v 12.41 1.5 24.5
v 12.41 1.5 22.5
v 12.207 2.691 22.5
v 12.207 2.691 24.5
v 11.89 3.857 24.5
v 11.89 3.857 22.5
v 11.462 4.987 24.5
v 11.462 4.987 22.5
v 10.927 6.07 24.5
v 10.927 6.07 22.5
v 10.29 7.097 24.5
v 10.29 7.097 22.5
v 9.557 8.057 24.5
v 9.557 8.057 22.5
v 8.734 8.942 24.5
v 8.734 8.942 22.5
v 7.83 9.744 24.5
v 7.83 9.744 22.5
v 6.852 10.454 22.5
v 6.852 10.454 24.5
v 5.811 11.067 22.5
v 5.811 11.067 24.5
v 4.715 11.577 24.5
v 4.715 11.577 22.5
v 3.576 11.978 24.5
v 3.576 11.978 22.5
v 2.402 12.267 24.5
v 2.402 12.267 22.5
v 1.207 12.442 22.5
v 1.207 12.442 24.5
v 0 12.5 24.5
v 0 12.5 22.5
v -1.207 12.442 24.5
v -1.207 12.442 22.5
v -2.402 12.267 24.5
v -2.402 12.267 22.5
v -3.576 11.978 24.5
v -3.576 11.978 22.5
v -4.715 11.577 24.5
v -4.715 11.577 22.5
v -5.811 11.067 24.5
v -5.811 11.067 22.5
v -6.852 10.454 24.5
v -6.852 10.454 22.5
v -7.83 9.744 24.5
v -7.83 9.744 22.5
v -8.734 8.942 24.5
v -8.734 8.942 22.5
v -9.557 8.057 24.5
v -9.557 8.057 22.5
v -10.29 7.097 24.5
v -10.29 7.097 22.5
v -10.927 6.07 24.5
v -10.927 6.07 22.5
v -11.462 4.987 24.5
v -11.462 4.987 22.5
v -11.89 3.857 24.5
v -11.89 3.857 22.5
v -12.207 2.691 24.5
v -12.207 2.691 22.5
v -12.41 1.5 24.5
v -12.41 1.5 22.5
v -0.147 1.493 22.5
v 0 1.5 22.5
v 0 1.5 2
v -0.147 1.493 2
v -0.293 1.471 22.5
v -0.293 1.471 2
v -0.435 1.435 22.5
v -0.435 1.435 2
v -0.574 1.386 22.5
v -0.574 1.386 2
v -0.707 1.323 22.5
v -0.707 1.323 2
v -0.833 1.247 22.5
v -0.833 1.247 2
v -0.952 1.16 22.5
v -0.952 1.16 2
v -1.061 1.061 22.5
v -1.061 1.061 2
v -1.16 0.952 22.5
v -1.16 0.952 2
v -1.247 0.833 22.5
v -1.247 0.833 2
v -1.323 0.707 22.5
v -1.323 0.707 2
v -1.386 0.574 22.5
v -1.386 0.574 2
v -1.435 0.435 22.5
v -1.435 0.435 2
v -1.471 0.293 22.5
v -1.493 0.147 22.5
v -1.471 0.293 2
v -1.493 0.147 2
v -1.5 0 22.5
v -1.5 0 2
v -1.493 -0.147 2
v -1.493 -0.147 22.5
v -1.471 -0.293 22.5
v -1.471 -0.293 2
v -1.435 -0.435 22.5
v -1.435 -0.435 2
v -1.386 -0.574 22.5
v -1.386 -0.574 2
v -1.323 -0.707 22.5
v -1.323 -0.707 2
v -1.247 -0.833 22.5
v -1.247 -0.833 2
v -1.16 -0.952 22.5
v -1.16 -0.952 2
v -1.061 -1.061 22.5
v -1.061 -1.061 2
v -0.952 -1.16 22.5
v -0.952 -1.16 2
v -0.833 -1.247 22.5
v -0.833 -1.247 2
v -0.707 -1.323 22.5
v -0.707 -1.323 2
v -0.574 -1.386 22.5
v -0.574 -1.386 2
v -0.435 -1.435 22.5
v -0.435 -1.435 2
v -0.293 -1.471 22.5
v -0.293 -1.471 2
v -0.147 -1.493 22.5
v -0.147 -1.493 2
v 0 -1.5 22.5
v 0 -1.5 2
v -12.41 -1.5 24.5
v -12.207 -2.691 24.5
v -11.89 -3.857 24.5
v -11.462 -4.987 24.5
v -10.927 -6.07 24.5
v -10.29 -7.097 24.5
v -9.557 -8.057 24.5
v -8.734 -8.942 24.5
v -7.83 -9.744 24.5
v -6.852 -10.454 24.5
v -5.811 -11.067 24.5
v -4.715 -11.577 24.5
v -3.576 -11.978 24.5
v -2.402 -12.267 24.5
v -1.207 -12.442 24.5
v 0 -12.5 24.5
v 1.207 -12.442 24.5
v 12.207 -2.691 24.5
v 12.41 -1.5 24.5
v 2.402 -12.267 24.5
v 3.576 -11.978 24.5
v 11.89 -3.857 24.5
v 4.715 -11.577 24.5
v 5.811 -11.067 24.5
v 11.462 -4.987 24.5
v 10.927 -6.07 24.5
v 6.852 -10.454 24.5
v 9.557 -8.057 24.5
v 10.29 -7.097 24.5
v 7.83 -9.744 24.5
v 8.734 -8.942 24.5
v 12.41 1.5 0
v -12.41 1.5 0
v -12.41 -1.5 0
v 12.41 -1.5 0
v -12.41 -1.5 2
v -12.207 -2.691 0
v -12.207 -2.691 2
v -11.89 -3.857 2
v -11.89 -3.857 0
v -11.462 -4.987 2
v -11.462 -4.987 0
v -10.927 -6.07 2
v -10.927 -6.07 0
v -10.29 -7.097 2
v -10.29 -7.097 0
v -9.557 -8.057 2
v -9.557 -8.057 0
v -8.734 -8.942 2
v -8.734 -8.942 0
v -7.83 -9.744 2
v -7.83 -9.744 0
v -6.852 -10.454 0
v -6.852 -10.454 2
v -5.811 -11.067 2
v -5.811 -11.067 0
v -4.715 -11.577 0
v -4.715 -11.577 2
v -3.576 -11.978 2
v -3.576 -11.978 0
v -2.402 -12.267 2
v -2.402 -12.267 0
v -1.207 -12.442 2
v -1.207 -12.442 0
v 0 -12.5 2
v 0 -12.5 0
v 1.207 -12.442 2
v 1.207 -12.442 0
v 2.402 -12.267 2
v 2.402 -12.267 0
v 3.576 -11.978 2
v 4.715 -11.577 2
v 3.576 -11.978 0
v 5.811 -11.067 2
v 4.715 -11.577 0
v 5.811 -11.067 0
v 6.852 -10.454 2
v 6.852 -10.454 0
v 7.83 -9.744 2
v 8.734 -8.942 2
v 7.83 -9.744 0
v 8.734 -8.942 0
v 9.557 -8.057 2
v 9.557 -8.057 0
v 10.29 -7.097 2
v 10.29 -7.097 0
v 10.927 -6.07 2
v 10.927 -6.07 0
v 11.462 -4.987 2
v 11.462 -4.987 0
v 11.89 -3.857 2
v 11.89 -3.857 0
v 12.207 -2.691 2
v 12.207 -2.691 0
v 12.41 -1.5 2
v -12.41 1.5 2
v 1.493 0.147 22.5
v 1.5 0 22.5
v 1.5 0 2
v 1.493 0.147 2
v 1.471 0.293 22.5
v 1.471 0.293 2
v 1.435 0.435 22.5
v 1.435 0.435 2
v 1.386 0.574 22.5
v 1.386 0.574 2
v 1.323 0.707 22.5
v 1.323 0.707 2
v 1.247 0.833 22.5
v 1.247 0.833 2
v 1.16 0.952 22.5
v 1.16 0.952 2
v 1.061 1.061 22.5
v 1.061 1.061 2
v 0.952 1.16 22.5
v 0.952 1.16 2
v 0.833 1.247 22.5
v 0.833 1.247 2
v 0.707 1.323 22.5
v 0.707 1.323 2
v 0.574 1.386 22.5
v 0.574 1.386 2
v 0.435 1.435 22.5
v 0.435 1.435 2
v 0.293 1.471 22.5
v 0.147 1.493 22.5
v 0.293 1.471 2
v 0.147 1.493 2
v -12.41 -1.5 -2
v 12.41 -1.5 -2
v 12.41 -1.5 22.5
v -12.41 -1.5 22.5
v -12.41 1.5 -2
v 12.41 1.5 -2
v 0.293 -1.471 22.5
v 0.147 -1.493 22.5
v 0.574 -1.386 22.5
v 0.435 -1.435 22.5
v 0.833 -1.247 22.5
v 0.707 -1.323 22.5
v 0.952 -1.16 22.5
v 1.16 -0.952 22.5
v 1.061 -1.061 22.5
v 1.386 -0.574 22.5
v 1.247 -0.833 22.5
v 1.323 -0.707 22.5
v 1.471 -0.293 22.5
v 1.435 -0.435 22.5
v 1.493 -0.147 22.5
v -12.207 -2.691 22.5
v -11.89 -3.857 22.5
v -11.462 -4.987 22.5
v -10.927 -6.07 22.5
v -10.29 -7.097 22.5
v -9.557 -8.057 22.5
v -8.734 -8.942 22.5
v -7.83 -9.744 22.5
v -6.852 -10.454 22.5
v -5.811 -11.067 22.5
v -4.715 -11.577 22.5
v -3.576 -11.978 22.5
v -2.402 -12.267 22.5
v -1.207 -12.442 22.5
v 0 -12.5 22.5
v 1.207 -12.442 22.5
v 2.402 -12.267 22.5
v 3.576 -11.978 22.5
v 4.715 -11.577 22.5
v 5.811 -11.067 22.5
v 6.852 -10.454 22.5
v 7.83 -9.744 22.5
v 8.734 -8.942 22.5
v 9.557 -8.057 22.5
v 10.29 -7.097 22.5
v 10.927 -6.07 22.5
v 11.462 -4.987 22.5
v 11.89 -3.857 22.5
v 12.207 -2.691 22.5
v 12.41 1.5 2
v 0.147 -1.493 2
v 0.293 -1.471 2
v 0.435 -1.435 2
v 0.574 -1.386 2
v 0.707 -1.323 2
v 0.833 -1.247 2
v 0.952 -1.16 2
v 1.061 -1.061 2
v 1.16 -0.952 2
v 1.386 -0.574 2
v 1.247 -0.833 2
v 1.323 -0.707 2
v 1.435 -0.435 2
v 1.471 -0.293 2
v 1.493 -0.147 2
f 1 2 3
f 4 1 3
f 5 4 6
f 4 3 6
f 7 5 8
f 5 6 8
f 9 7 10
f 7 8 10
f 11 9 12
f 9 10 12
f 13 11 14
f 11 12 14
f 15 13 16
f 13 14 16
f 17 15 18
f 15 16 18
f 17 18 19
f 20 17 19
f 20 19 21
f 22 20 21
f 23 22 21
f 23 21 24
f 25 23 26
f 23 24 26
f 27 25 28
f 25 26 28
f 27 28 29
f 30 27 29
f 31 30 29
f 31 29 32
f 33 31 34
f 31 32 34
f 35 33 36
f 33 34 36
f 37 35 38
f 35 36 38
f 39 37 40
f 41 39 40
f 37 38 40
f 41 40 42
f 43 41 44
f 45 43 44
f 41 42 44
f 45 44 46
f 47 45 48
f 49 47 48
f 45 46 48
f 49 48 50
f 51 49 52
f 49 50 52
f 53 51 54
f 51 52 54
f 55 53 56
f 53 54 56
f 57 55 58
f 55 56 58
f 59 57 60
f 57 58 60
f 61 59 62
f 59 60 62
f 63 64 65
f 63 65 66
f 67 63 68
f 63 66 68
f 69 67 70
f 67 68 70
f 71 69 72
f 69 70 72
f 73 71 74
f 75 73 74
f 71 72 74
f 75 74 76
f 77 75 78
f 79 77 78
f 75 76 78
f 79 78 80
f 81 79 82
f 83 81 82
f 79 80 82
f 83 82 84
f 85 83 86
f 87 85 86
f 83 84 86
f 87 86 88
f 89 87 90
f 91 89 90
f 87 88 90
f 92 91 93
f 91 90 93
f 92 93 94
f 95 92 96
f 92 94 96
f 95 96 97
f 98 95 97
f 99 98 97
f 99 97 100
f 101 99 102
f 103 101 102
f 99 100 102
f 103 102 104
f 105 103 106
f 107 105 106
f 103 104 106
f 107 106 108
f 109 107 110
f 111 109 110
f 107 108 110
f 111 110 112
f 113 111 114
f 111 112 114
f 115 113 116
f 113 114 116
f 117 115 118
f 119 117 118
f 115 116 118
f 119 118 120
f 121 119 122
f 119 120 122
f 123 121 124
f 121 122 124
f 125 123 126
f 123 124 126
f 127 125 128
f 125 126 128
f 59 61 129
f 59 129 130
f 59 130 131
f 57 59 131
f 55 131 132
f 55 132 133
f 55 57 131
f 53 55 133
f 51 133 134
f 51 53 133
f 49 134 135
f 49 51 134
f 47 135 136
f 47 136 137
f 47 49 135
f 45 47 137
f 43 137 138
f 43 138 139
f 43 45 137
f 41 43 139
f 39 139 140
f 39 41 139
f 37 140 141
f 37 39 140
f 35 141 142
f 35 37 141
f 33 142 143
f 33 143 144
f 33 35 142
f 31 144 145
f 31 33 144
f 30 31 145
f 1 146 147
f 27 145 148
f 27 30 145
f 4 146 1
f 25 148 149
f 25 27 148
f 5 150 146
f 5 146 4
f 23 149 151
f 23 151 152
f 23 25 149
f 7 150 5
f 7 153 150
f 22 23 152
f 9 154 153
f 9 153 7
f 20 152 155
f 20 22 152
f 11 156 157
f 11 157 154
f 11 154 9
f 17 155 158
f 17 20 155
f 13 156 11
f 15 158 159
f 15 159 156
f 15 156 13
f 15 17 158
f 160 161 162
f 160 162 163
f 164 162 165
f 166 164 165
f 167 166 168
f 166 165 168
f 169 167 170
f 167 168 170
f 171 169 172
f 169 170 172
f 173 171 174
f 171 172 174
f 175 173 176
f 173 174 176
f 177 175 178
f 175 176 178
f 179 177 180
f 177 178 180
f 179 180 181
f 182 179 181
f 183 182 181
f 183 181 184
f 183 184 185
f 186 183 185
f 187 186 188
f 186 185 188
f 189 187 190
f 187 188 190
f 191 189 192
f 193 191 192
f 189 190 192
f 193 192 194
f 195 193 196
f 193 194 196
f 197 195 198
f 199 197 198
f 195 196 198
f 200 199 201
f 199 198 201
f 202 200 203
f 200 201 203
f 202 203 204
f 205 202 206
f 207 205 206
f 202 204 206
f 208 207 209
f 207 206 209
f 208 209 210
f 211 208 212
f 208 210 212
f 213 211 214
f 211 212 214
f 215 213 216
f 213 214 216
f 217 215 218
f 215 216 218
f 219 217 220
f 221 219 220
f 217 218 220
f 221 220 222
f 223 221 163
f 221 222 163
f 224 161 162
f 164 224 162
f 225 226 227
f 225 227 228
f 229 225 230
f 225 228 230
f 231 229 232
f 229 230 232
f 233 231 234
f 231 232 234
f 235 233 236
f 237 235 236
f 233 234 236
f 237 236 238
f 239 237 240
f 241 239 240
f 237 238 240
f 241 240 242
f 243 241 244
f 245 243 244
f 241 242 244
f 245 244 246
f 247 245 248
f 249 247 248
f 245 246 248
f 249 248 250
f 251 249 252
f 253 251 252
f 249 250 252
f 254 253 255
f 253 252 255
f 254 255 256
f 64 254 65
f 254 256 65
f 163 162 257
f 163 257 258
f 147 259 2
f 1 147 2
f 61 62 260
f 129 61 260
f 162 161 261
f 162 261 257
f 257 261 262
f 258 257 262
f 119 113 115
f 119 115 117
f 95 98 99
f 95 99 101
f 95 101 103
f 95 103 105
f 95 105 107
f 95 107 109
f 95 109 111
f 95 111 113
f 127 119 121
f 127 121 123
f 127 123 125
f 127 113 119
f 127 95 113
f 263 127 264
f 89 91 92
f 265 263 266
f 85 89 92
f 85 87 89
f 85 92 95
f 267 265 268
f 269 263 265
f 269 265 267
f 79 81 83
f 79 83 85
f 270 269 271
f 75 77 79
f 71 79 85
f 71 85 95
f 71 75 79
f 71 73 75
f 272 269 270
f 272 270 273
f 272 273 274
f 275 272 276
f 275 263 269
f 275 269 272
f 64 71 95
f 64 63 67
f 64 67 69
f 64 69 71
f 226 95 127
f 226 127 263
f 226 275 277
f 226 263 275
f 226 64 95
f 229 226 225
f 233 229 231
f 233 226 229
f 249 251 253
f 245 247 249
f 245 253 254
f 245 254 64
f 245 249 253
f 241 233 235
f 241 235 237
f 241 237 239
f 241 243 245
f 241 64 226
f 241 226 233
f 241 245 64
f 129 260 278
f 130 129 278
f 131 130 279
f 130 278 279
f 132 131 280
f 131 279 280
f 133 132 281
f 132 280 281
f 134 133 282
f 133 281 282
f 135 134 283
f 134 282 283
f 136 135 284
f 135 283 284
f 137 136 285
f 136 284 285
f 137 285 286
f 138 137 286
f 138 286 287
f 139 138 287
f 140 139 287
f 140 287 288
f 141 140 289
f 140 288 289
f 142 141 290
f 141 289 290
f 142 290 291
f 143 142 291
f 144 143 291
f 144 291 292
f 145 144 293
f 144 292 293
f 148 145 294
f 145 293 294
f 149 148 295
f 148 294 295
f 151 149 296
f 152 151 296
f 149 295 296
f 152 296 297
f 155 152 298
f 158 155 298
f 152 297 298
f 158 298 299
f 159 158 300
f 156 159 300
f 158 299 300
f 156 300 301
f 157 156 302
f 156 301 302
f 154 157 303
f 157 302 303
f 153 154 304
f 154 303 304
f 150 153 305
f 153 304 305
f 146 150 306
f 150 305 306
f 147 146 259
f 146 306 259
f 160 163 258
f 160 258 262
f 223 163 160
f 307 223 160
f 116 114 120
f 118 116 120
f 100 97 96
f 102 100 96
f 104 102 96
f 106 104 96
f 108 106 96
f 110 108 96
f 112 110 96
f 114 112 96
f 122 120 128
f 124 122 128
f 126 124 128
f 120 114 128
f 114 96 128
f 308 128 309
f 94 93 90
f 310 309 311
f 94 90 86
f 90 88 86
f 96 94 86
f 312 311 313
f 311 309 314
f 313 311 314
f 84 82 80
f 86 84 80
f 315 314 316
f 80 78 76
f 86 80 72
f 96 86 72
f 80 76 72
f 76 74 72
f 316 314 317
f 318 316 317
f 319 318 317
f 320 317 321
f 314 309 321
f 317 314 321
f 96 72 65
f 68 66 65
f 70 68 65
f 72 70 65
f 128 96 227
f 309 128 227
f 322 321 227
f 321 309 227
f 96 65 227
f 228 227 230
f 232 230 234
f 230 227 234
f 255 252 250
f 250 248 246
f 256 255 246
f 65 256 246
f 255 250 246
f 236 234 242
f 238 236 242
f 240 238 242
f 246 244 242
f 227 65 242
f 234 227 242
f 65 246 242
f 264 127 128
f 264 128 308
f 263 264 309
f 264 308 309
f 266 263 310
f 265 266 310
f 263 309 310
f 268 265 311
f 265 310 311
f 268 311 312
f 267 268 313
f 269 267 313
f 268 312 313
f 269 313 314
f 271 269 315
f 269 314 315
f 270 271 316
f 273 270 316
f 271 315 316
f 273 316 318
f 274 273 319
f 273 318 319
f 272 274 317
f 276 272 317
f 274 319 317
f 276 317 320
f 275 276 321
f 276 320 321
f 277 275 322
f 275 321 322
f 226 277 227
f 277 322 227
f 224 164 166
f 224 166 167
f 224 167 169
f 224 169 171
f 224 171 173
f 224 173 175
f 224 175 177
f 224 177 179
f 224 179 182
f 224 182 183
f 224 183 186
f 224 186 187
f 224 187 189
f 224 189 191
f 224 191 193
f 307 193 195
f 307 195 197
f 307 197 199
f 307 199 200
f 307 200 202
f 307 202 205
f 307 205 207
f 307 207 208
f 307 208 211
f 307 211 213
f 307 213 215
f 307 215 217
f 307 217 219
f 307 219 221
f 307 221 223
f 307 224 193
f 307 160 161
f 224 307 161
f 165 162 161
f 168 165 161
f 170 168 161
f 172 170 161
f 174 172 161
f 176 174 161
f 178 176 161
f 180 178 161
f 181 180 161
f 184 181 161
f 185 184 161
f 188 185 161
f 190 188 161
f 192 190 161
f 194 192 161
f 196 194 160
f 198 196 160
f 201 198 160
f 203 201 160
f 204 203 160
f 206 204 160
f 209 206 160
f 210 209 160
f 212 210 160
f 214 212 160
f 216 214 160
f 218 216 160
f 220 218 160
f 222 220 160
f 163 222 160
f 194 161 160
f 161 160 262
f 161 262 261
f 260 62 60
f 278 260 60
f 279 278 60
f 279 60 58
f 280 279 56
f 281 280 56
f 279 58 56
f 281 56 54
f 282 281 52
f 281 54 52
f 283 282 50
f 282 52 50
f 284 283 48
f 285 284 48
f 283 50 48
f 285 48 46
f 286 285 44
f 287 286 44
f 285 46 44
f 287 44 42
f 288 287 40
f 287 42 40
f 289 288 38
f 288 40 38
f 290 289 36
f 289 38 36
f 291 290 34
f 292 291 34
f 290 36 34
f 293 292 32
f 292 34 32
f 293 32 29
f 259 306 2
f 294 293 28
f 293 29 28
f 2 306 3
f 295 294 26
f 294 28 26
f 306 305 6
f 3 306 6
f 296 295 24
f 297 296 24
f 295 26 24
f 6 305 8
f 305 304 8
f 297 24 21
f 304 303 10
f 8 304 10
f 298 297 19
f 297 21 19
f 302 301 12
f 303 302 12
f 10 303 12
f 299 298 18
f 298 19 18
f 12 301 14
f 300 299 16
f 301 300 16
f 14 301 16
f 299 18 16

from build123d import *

# Parameters (mm, degrees)
F1_DEPTH = 2
F2_START = 2
F2_DEPTH = 20.5
F3_START = 22.5
F3_DEPTH = 2
F4_DEPTH = 2


with BuildPart() as f1:
    # F0 (on Top) → F1 (new body)
    with BuildSketch(Plane.XY):
        with BuildLine():
            Line((12.409673646, 0), (1.5, 0))
            ThreePointArc((1.5, 0), (1.0606601732, -1.0606601704), (3.9e-09, -1.5))
            Line((3.9e-09, -1.5), (12.409673646, -1.5))
            Line((12.409673646, -1.5), (12.409673646, 0))
        make_face()
        with BuildLine():
            ThreePointArc((3.9e-09, -1.5), (1.0606601732, -1.0606601704), (1.5, 0))
            Line((1.5, 0), (-1.5, 0))
            ThreePointArc((-1.5, 0), (-1.0606601704, -1.0606601732), (3.9e-09, -1.5))
        make_face()
        with BuildLine():
            Line((-12.409673646, -1.5), (3.9e-09, -1.5))
            ThreePointArc((3.9e-09, -1.5), (-1.0606601704, -1.0606601732), (-1.5, 0))
            Line((-1.5, 0), (-12.409673646, 0))
            Line((-12.409673646, 0), (-12.409673646, -1.5))
        make_face()
        with BuildLine():
            Line((12.409673646, -1.5), (3.9e-09, -1.5))
            Line((3.9e-09, -1.5), (-12.409673646, -1.5))
            ThreePointArc((-12.409673646, -1.5), (0, -12.5), (12.409673646, -1.5))
        make_face()
        with BuildLine():
            ThreePointArc((-1.5, 0), (-1.0606601718, 1.0606601718), (0, 1.5))
            Line((0, 1.5), (-12.409673646, 1.5))
            Line((-12.409673646, 1.5), (-12.409673646, 0))
            Line((-12.409673646, 0), (-1.5, 0))
        make_face()
        with BuildLine():
            ThreePointArc((0, 1.5), (1.0606601718, 1.0606601718), (1.5, 0))
            Line((1.5, 0), (12.409673646, 0))
            Line((12.409673646, 0), (12.409673646, 1.5))
            Line((12.409673646, 1.5), (0, 1.5))
        make_face()
        with BuildLine():
            Line((-1.5, 0), (1.5, 0))
            ThreePointArc((1.5, 0), (1.0606601718, 1.0606601718), (0, 1.5))
            ThreePointArc((0, 1.5), (-1.0606601718, 1.0606601718), (-1.5, 0))
        make_face()
    extrude(amount=F1_DEPTH)


with BuildPart() as f2:
    # F0 (on Top) → F2 (new body)
    with BuildSketch(Plane.XY.offset(F2_START)):
        with BuildLine():
            ThreePointArc((3.9e-09, -1.5), (1.0606601732, -1.0606601704), (1.5, 0))
            Line((1.5, 0), (-1.5, 0))
            ThreePointArc((-1.5, 0), (-1.0606601704, -1.0606601732), (3.9e-09, -1.5))
        make_face()
        with BuildLine():
            Line((-1.5, 0), (1.5, 0))
            ThreePointArc((1.5, 0), (1.0606601718, 1.0606601718), (0, 1.5))
            ThreePointArc((0, 1.5), (-1.0606601718, 1.0606601718), (-1.5, 0))
        make_face()
    extrude(amount=F2_DEPTH)


with BuildPart() as f3:
    # F0 (on Top) → F3 (new body)
    with BuildSketch(Plane.XY.offset(F3_START)):
        with BuildLine():
            ThreePointArc((0, 1.5), (1.0606601718, 1.0606601718), (1.5, 0))
            Line((1.5, 0), (12.409673646, 0))
            Line((12.409673646, 0), (12.409673646, 1.5))
            Line((12.409673646, 1.5), (0, 1.5))
        make_face()
        with BuildLine():
            Line((-1.5, 0), (1.5, 0))
            ThreePointArc((1.5, 0), (1.0606601718, 1.0606601718), (0, 1.5))
            ThreePointArc((0, 1.5), (-1.0606601718, 1.0606601718), (-1.5, 0))
        make_face()
        with BuildLine():
            ThreePointArc((3.9e-09, -1.5), (1.0606601732, -1.0606601704), (1.5, 0))
            Line((1.5, 0), (-1.5, 0))
            ThreePointArc((-1.5, 0), (-1.0606601704, -1.0606601732), (3.9e-09, -1.5))
        make_face()
        with BuildLine():
            Line((12.409673646, 0), (1.5, 0))
            ThreePointArc((1.5, 0), (1.0606601732, -1.0606601704), (3.9e-09, -1.5))
            Line((3.9e-09, -1.5), (12.409673646, -1.5))
            Line((12.409673646, -1.5), (12.409673646, 0))
        make_face()
        with BuildLine():
            Line((-12.409673646, -1.5), (3.9e-09, -1.5))
            ThreePointArc((3.9e-09, -1.5), (-1.0606601704, -1.0606601732), (-1.5, 0))
            Line((-1.5, 0), (-12.409673646, 0))
            Line((-12.409673646, 0), (-12.409673646, -1.5))
        make_face()
        with BuildLine():
            ThreePointArc((-1.5, 0), (-1.0606601718, 1.0606601718), (0, 1.5))
            Line((0, 1.5), (-12.409673646, 1.5))
            Line((-12.409673646, 1.5), (-12.409673646, 0))
            Line((-12.409673646, 0), (-1.5, 0))
        make_face()
        with BuildLine():
            Line((-12.409673646, 1.5), (0, 1.5))
            Line((0, 1.5), (12.409673646, 1.5))
            ThreePointArc((12.409673646, 1.5), (0, 12.5), (-12.409673646, 1.5))
        make_face()
        with BuildLine():
            Line((12.409673646, -1.5), (3.9e-09, -1.5))
            Line((3.9e-09, -1.5), (-12.409673646, -1.5))
            ThreePointArc((-12.409673646, -1.5), (0, -12.5), (12.409673646, -1.5))
        make_face()
    extrude(amount=F3_DEPTH)


with BuildPart() as f4:
    # F0 (on Top) → F4 (new body)
    with BuildSketch(Plane.XY):
        with BuildLine():
            ThreePointArc((-1.5, 0), (-1.0606601718, 1.0606601718), (0, 1.5))
            Line((0, 1.5), (-12.409673646, 1.5))
            Line((-12.409673646, 1.5), (-12.409673646, 0))
            Line((-12.409673646, 0), (-1.5, 0))
        make_face()
        with BuildLine():
            ThreePointArc((0, 1.5), (1.0606601718, 1.0606601718), (1.5, 0))
            Line((1.5, 0), (12.409673646, 0))
            Line((12.409673646, 0), (12.409673646, 1.5))
            Line((12.409673646, 1.5), (0, 1.5))
        make_face()
        with BuildLine():
            Line((12.409673646, 0), (1.5, 0))
            ThreePointArc((1.5, 0), (1.0606601732, -1.0606601704), (3.9e-09, -1.5))
            Line((3.9e-09, -1.5), (12.409673646, -1.5))
            Line((12.409673646, -1.5), (12.409673646, 0))
        make_face()
        with BuildLine():
            Line((-1.5, 0), (1.5, 0))
            ThreePointArc((1.5, 0), (1.0606601718, 1.0606601718), (0, 1.5))
            ThreePointArc((0, 1.5), (-1.0606601718, 1.0606601718), (-1.5, 0))
        make_face()
        with BuildLine():
            ThreePointArc((3.9e-09, -1.5), (1.0606601732, -1.0606601704), (1.5, 0))
            Line((1.5, 0), (-1.5, 0))
            ThreePointArc((-1.5, 0), (-1.0606601704, -1.0606601732), (3.9e-09, -1.5))
        make_face()
        with BuildLine():
            Line((-12.409673646, -1.5), (3.9e-09, -1.5))
            ThreePointArc((3.9e-09, -1.5), (-1.0606601704, -1.0606601732), (-1.5, 0))
            Line((-1.5, 0), (-12.409673646, 0))
            Line((-12.409673646, 0), (-12.409673646, -1.5))
        make_face()
    extrude(amount=-F4_DEPTH)


solid = Compound([f1.part, f2.part, f3.part, f4.part])
